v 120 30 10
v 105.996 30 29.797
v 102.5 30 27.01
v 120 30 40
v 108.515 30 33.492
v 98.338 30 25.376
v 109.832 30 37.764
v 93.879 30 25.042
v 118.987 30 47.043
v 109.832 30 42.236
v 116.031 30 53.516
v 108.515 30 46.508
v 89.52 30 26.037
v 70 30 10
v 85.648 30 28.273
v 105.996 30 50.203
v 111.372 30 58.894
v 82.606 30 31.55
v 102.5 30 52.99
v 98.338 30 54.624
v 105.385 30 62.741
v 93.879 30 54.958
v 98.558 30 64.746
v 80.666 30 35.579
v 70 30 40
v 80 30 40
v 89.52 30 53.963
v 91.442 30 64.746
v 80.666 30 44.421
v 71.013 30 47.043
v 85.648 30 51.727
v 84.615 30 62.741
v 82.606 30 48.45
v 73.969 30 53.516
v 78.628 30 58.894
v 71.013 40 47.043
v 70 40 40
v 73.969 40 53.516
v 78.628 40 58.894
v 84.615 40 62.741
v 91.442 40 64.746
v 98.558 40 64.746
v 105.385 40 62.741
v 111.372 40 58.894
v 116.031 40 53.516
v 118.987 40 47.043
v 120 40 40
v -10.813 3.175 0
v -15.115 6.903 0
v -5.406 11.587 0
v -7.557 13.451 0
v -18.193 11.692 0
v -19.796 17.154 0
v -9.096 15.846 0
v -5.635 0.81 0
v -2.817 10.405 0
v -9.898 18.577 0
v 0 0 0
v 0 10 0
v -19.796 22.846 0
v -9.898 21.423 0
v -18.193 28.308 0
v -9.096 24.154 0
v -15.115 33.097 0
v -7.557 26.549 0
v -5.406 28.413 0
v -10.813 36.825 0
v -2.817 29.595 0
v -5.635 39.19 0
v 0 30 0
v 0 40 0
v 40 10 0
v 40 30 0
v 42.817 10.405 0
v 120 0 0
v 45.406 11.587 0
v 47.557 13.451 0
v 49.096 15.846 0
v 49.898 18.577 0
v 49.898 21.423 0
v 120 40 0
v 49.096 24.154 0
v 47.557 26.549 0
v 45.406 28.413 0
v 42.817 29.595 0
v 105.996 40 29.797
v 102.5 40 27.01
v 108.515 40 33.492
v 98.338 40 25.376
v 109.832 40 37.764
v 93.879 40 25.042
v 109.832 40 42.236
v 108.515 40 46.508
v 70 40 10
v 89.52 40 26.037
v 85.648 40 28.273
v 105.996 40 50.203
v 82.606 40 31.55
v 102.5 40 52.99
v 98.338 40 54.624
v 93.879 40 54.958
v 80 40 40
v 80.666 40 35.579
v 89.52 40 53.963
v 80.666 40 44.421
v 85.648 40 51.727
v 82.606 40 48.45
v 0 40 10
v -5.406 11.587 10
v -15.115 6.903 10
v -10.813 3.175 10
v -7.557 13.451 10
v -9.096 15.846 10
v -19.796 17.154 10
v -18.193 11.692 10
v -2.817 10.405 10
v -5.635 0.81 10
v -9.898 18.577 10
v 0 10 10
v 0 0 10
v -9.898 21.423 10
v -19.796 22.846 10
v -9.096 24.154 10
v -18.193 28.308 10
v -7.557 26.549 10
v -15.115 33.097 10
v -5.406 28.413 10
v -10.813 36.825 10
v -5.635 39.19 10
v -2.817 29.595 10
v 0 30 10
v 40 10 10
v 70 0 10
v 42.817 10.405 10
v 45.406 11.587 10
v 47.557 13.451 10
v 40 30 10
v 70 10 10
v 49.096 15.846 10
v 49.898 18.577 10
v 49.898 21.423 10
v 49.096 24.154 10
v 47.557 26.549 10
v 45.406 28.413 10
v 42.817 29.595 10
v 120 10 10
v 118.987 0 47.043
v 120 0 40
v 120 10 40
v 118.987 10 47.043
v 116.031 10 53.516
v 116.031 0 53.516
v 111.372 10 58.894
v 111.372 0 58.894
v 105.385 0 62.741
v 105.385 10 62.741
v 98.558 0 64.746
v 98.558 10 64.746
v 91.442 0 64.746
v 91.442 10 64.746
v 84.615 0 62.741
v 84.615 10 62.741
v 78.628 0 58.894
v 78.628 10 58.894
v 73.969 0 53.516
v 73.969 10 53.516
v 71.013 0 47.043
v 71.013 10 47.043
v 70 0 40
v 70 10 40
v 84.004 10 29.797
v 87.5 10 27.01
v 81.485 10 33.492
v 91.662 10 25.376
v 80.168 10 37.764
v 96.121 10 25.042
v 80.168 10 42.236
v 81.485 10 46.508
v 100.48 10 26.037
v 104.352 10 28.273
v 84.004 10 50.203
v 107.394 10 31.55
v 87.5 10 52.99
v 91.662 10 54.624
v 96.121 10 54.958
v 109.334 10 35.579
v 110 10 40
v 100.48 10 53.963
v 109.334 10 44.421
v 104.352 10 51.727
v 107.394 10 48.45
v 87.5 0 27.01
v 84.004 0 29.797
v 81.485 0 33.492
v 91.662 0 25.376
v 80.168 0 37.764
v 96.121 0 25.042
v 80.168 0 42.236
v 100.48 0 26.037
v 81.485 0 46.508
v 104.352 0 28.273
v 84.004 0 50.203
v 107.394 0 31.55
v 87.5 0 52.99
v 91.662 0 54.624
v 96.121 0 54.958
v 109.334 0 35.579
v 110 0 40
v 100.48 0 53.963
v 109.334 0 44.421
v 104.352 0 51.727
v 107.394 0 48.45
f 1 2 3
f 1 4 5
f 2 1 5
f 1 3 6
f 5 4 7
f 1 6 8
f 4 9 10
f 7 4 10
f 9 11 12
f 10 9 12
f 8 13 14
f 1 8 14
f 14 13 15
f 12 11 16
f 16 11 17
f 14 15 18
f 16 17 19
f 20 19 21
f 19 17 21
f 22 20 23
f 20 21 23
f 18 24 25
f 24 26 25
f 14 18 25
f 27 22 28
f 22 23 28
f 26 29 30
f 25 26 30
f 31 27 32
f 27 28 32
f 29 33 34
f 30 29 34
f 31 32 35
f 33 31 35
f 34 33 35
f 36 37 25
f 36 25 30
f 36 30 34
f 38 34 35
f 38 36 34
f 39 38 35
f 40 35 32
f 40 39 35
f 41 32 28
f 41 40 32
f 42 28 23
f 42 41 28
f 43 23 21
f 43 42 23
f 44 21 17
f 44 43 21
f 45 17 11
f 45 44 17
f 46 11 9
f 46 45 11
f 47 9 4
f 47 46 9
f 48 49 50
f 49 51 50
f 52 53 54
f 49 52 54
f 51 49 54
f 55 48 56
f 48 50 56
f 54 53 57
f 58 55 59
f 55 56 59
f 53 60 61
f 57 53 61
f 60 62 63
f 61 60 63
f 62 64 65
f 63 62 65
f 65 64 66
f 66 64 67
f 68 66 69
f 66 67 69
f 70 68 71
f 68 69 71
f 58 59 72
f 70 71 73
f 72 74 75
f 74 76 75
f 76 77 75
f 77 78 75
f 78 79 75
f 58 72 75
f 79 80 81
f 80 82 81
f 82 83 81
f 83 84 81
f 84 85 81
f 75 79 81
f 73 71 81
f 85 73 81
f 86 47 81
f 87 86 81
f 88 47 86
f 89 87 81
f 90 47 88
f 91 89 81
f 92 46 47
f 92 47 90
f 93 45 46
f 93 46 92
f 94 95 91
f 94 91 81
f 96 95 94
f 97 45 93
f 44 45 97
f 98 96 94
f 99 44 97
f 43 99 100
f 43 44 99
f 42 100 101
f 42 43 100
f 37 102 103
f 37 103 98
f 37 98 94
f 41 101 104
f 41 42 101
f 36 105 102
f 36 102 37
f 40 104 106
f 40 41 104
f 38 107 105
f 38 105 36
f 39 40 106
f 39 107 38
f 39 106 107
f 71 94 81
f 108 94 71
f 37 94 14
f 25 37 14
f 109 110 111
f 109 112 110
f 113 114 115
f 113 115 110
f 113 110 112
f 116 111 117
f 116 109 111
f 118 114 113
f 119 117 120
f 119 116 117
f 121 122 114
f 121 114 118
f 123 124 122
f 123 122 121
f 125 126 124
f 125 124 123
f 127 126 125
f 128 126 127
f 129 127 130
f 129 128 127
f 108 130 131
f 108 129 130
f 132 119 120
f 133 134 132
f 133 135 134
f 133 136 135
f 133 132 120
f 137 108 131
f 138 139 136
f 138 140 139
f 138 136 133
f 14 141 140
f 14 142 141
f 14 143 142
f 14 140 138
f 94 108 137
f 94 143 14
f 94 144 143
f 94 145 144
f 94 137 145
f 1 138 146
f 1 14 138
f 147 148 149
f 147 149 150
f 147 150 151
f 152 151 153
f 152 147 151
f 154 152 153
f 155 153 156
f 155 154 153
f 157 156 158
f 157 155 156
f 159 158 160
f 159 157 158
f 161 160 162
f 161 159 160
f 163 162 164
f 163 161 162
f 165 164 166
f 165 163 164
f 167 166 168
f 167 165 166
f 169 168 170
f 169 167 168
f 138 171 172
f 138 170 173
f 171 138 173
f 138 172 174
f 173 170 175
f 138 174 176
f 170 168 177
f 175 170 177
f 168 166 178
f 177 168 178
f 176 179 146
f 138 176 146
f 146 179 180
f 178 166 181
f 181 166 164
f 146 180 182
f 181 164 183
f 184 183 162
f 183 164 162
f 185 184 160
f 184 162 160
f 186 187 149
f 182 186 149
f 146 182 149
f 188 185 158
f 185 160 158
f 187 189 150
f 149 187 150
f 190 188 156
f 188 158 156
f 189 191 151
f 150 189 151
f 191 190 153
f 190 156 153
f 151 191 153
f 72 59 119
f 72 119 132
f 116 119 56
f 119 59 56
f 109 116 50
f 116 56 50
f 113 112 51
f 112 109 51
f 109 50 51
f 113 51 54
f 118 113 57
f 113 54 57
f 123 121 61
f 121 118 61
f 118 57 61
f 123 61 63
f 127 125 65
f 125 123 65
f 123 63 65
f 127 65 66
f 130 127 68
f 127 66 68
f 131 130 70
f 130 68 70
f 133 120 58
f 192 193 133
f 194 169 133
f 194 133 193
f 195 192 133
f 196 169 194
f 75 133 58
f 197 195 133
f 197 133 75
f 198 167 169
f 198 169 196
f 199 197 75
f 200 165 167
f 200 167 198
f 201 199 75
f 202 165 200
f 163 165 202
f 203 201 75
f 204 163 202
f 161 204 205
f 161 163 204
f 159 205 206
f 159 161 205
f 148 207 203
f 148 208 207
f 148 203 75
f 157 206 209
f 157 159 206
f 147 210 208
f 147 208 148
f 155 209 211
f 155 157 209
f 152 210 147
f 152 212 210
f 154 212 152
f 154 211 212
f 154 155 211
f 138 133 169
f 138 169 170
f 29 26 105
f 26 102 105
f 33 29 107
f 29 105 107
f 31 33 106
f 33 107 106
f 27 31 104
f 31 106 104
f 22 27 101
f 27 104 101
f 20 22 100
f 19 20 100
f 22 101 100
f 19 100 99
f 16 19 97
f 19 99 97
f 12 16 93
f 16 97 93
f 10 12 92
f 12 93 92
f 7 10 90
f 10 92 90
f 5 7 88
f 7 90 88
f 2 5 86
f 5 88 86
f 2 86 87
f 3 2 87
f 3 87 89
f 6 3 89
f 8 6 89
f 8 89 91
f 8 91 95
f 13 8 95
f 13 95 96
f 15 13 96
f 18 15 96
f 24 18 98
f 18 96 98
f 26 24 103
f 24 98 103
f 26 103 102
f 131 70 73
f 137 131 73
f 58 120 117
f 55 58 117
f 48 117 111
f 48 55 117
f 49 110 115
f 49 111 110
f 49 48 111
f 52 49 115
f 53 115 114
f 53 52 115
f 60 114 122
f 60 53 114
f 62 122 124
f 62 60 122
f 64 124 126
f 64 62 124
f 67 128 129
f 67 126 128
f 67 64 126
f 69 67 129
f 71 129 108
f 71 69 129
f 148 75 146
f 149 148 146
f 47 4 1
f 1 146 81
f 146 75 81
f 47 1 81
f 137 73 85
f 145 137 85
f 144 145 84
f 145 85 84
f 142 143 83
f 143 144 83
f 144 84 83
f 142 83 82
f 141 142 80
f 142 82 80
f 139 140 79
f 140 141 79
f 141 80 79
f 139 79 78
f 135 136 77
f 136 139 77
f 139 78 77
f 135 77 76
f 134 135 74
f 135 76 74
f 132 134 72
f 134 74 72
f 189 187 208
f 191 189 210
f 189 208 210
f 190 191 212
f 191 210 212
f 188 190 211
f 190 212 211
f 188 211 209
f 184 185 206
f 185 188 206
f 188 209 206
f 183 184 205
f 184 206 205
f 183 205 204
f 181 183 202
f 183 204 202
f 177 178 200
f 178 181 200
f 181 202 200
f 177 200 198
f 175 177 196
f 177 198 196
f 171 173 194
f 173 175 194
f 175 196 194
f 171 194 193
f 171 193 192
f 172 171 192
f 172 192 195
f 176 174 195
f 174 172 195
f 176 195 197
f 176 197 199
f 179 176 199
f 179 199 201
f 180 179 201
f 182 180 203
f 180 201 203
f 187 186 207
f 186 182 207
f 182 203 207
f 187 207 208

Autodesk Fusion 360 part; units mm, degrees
sketch "Sketch1" plane through (0, 0, 0) normal (0, 0, 1) x (1, 0, 0)
  line L0 (0, 0) -> (120, 0)
  line L1 (120, 0) -> (120, 40)
  line L2 (120, 40) -> (0, 40)
  arc A0 (0, 40) -> (0, 0) centre (0, 20) ccw
  line L3 (120, 40) -> (70, 40)
  line L4 (70, 40) -> (70, 30)
  line L5 (70, 30) -> (120, 30)
  line L6 (120, 30) -> (120, 40)
  line L7 (120, 0) -> (70, 0)
  line L8 (70, 0) -> (70, 10)
  line L9 (70, 10) -> (120, 10)
  line L10 (120, 10) -> (120, 0)
  line L11 (0, 30) -> (40, 30)
  line L12 (0, 10) -> (40, 10)
  arc A1 (0, 30) -> (0, 10) centre (0, 20) ccw
  arc A2 (40, 10) -> (40, 30) centre (40, 20) ccw
  dimension "d1" = 120
  dimension "d2" = 40
  dimension "d3" = 50
  dimension "d4" = 10
  dimension "d5" = 50
  dimension "d6" = 10
  dimension "d7" = 20
  dimension "d8" = 40
  dimension "d9" = 20
extrude "Extrude1" add sketch "Sketch1" along normal blind 10 contours L0 L1 L2 A0 L4 L5 L8 L9
extrude "Extrude2" add sketch "Sketch1" along normal blind 40 contours L0 L1 L7 L8 L9 L10 | L1 L2 L3 L4 L5 L6
sketch "Sketch2" plane through (0, 0, 0) normal (0, -1, 0) x (1, 0, 0)
  line L0 (0, 0) -> (120, 0)
  line L1 (120, 0) -> (120, 40)
  line L2 (120, 40) -> (70, 40)
  line L3 (70, 40) -> (70, 10)
  line L4 (70, 10) -> (0, 10)
  line L5 (0, 10) -> (0, 0)
  circle A0 centre (95, 40) radius 15
  arc A1 (120, 40) -> (70, 40) centre (95, 40) ccw
  dimension "d14" = 30
  dimension "d15" = 50
extrude "Extrude3" add sketch "Sketch2" against normal blind 10 contours L2 A0 A1
extrude "Extrude4" cut sketch "Sketch2" against normal blind 10 contours L2 A0 picked at (96.1126, 35.1254)
sketch "Sketch3" plane through (0, 40, 0) normal (0, 1, 0) x (-1, 0, 0)
  line L0 (-120, 0) -> (0, 0)
  line L1 (0, 0) -> (0, 10)
  line L2 (0, 10) -> (-70, 10)
  line L3 (-70, 10) -> (-70, 40)
  line L4 (-70, 40) -> (-120, 40)
  line L5 (-120, 40) -> (-120, 0)
  circle A0 centre (-95, 40) radius 15
  arc A1 (-70, 40) -> (-120, 40) centre (-95, 40) ccw
  dimension "d20" = 30
  dimension "d21" = 50
extrude "Extrude5" cut sketch "Sketch3" against normal blind 10 contours L4 A0 picked at (-93.8874, 35.1254)
extrude "Extrude6" add sketch "Sketch3" against normal blind 10 contours L4 A0 A1
